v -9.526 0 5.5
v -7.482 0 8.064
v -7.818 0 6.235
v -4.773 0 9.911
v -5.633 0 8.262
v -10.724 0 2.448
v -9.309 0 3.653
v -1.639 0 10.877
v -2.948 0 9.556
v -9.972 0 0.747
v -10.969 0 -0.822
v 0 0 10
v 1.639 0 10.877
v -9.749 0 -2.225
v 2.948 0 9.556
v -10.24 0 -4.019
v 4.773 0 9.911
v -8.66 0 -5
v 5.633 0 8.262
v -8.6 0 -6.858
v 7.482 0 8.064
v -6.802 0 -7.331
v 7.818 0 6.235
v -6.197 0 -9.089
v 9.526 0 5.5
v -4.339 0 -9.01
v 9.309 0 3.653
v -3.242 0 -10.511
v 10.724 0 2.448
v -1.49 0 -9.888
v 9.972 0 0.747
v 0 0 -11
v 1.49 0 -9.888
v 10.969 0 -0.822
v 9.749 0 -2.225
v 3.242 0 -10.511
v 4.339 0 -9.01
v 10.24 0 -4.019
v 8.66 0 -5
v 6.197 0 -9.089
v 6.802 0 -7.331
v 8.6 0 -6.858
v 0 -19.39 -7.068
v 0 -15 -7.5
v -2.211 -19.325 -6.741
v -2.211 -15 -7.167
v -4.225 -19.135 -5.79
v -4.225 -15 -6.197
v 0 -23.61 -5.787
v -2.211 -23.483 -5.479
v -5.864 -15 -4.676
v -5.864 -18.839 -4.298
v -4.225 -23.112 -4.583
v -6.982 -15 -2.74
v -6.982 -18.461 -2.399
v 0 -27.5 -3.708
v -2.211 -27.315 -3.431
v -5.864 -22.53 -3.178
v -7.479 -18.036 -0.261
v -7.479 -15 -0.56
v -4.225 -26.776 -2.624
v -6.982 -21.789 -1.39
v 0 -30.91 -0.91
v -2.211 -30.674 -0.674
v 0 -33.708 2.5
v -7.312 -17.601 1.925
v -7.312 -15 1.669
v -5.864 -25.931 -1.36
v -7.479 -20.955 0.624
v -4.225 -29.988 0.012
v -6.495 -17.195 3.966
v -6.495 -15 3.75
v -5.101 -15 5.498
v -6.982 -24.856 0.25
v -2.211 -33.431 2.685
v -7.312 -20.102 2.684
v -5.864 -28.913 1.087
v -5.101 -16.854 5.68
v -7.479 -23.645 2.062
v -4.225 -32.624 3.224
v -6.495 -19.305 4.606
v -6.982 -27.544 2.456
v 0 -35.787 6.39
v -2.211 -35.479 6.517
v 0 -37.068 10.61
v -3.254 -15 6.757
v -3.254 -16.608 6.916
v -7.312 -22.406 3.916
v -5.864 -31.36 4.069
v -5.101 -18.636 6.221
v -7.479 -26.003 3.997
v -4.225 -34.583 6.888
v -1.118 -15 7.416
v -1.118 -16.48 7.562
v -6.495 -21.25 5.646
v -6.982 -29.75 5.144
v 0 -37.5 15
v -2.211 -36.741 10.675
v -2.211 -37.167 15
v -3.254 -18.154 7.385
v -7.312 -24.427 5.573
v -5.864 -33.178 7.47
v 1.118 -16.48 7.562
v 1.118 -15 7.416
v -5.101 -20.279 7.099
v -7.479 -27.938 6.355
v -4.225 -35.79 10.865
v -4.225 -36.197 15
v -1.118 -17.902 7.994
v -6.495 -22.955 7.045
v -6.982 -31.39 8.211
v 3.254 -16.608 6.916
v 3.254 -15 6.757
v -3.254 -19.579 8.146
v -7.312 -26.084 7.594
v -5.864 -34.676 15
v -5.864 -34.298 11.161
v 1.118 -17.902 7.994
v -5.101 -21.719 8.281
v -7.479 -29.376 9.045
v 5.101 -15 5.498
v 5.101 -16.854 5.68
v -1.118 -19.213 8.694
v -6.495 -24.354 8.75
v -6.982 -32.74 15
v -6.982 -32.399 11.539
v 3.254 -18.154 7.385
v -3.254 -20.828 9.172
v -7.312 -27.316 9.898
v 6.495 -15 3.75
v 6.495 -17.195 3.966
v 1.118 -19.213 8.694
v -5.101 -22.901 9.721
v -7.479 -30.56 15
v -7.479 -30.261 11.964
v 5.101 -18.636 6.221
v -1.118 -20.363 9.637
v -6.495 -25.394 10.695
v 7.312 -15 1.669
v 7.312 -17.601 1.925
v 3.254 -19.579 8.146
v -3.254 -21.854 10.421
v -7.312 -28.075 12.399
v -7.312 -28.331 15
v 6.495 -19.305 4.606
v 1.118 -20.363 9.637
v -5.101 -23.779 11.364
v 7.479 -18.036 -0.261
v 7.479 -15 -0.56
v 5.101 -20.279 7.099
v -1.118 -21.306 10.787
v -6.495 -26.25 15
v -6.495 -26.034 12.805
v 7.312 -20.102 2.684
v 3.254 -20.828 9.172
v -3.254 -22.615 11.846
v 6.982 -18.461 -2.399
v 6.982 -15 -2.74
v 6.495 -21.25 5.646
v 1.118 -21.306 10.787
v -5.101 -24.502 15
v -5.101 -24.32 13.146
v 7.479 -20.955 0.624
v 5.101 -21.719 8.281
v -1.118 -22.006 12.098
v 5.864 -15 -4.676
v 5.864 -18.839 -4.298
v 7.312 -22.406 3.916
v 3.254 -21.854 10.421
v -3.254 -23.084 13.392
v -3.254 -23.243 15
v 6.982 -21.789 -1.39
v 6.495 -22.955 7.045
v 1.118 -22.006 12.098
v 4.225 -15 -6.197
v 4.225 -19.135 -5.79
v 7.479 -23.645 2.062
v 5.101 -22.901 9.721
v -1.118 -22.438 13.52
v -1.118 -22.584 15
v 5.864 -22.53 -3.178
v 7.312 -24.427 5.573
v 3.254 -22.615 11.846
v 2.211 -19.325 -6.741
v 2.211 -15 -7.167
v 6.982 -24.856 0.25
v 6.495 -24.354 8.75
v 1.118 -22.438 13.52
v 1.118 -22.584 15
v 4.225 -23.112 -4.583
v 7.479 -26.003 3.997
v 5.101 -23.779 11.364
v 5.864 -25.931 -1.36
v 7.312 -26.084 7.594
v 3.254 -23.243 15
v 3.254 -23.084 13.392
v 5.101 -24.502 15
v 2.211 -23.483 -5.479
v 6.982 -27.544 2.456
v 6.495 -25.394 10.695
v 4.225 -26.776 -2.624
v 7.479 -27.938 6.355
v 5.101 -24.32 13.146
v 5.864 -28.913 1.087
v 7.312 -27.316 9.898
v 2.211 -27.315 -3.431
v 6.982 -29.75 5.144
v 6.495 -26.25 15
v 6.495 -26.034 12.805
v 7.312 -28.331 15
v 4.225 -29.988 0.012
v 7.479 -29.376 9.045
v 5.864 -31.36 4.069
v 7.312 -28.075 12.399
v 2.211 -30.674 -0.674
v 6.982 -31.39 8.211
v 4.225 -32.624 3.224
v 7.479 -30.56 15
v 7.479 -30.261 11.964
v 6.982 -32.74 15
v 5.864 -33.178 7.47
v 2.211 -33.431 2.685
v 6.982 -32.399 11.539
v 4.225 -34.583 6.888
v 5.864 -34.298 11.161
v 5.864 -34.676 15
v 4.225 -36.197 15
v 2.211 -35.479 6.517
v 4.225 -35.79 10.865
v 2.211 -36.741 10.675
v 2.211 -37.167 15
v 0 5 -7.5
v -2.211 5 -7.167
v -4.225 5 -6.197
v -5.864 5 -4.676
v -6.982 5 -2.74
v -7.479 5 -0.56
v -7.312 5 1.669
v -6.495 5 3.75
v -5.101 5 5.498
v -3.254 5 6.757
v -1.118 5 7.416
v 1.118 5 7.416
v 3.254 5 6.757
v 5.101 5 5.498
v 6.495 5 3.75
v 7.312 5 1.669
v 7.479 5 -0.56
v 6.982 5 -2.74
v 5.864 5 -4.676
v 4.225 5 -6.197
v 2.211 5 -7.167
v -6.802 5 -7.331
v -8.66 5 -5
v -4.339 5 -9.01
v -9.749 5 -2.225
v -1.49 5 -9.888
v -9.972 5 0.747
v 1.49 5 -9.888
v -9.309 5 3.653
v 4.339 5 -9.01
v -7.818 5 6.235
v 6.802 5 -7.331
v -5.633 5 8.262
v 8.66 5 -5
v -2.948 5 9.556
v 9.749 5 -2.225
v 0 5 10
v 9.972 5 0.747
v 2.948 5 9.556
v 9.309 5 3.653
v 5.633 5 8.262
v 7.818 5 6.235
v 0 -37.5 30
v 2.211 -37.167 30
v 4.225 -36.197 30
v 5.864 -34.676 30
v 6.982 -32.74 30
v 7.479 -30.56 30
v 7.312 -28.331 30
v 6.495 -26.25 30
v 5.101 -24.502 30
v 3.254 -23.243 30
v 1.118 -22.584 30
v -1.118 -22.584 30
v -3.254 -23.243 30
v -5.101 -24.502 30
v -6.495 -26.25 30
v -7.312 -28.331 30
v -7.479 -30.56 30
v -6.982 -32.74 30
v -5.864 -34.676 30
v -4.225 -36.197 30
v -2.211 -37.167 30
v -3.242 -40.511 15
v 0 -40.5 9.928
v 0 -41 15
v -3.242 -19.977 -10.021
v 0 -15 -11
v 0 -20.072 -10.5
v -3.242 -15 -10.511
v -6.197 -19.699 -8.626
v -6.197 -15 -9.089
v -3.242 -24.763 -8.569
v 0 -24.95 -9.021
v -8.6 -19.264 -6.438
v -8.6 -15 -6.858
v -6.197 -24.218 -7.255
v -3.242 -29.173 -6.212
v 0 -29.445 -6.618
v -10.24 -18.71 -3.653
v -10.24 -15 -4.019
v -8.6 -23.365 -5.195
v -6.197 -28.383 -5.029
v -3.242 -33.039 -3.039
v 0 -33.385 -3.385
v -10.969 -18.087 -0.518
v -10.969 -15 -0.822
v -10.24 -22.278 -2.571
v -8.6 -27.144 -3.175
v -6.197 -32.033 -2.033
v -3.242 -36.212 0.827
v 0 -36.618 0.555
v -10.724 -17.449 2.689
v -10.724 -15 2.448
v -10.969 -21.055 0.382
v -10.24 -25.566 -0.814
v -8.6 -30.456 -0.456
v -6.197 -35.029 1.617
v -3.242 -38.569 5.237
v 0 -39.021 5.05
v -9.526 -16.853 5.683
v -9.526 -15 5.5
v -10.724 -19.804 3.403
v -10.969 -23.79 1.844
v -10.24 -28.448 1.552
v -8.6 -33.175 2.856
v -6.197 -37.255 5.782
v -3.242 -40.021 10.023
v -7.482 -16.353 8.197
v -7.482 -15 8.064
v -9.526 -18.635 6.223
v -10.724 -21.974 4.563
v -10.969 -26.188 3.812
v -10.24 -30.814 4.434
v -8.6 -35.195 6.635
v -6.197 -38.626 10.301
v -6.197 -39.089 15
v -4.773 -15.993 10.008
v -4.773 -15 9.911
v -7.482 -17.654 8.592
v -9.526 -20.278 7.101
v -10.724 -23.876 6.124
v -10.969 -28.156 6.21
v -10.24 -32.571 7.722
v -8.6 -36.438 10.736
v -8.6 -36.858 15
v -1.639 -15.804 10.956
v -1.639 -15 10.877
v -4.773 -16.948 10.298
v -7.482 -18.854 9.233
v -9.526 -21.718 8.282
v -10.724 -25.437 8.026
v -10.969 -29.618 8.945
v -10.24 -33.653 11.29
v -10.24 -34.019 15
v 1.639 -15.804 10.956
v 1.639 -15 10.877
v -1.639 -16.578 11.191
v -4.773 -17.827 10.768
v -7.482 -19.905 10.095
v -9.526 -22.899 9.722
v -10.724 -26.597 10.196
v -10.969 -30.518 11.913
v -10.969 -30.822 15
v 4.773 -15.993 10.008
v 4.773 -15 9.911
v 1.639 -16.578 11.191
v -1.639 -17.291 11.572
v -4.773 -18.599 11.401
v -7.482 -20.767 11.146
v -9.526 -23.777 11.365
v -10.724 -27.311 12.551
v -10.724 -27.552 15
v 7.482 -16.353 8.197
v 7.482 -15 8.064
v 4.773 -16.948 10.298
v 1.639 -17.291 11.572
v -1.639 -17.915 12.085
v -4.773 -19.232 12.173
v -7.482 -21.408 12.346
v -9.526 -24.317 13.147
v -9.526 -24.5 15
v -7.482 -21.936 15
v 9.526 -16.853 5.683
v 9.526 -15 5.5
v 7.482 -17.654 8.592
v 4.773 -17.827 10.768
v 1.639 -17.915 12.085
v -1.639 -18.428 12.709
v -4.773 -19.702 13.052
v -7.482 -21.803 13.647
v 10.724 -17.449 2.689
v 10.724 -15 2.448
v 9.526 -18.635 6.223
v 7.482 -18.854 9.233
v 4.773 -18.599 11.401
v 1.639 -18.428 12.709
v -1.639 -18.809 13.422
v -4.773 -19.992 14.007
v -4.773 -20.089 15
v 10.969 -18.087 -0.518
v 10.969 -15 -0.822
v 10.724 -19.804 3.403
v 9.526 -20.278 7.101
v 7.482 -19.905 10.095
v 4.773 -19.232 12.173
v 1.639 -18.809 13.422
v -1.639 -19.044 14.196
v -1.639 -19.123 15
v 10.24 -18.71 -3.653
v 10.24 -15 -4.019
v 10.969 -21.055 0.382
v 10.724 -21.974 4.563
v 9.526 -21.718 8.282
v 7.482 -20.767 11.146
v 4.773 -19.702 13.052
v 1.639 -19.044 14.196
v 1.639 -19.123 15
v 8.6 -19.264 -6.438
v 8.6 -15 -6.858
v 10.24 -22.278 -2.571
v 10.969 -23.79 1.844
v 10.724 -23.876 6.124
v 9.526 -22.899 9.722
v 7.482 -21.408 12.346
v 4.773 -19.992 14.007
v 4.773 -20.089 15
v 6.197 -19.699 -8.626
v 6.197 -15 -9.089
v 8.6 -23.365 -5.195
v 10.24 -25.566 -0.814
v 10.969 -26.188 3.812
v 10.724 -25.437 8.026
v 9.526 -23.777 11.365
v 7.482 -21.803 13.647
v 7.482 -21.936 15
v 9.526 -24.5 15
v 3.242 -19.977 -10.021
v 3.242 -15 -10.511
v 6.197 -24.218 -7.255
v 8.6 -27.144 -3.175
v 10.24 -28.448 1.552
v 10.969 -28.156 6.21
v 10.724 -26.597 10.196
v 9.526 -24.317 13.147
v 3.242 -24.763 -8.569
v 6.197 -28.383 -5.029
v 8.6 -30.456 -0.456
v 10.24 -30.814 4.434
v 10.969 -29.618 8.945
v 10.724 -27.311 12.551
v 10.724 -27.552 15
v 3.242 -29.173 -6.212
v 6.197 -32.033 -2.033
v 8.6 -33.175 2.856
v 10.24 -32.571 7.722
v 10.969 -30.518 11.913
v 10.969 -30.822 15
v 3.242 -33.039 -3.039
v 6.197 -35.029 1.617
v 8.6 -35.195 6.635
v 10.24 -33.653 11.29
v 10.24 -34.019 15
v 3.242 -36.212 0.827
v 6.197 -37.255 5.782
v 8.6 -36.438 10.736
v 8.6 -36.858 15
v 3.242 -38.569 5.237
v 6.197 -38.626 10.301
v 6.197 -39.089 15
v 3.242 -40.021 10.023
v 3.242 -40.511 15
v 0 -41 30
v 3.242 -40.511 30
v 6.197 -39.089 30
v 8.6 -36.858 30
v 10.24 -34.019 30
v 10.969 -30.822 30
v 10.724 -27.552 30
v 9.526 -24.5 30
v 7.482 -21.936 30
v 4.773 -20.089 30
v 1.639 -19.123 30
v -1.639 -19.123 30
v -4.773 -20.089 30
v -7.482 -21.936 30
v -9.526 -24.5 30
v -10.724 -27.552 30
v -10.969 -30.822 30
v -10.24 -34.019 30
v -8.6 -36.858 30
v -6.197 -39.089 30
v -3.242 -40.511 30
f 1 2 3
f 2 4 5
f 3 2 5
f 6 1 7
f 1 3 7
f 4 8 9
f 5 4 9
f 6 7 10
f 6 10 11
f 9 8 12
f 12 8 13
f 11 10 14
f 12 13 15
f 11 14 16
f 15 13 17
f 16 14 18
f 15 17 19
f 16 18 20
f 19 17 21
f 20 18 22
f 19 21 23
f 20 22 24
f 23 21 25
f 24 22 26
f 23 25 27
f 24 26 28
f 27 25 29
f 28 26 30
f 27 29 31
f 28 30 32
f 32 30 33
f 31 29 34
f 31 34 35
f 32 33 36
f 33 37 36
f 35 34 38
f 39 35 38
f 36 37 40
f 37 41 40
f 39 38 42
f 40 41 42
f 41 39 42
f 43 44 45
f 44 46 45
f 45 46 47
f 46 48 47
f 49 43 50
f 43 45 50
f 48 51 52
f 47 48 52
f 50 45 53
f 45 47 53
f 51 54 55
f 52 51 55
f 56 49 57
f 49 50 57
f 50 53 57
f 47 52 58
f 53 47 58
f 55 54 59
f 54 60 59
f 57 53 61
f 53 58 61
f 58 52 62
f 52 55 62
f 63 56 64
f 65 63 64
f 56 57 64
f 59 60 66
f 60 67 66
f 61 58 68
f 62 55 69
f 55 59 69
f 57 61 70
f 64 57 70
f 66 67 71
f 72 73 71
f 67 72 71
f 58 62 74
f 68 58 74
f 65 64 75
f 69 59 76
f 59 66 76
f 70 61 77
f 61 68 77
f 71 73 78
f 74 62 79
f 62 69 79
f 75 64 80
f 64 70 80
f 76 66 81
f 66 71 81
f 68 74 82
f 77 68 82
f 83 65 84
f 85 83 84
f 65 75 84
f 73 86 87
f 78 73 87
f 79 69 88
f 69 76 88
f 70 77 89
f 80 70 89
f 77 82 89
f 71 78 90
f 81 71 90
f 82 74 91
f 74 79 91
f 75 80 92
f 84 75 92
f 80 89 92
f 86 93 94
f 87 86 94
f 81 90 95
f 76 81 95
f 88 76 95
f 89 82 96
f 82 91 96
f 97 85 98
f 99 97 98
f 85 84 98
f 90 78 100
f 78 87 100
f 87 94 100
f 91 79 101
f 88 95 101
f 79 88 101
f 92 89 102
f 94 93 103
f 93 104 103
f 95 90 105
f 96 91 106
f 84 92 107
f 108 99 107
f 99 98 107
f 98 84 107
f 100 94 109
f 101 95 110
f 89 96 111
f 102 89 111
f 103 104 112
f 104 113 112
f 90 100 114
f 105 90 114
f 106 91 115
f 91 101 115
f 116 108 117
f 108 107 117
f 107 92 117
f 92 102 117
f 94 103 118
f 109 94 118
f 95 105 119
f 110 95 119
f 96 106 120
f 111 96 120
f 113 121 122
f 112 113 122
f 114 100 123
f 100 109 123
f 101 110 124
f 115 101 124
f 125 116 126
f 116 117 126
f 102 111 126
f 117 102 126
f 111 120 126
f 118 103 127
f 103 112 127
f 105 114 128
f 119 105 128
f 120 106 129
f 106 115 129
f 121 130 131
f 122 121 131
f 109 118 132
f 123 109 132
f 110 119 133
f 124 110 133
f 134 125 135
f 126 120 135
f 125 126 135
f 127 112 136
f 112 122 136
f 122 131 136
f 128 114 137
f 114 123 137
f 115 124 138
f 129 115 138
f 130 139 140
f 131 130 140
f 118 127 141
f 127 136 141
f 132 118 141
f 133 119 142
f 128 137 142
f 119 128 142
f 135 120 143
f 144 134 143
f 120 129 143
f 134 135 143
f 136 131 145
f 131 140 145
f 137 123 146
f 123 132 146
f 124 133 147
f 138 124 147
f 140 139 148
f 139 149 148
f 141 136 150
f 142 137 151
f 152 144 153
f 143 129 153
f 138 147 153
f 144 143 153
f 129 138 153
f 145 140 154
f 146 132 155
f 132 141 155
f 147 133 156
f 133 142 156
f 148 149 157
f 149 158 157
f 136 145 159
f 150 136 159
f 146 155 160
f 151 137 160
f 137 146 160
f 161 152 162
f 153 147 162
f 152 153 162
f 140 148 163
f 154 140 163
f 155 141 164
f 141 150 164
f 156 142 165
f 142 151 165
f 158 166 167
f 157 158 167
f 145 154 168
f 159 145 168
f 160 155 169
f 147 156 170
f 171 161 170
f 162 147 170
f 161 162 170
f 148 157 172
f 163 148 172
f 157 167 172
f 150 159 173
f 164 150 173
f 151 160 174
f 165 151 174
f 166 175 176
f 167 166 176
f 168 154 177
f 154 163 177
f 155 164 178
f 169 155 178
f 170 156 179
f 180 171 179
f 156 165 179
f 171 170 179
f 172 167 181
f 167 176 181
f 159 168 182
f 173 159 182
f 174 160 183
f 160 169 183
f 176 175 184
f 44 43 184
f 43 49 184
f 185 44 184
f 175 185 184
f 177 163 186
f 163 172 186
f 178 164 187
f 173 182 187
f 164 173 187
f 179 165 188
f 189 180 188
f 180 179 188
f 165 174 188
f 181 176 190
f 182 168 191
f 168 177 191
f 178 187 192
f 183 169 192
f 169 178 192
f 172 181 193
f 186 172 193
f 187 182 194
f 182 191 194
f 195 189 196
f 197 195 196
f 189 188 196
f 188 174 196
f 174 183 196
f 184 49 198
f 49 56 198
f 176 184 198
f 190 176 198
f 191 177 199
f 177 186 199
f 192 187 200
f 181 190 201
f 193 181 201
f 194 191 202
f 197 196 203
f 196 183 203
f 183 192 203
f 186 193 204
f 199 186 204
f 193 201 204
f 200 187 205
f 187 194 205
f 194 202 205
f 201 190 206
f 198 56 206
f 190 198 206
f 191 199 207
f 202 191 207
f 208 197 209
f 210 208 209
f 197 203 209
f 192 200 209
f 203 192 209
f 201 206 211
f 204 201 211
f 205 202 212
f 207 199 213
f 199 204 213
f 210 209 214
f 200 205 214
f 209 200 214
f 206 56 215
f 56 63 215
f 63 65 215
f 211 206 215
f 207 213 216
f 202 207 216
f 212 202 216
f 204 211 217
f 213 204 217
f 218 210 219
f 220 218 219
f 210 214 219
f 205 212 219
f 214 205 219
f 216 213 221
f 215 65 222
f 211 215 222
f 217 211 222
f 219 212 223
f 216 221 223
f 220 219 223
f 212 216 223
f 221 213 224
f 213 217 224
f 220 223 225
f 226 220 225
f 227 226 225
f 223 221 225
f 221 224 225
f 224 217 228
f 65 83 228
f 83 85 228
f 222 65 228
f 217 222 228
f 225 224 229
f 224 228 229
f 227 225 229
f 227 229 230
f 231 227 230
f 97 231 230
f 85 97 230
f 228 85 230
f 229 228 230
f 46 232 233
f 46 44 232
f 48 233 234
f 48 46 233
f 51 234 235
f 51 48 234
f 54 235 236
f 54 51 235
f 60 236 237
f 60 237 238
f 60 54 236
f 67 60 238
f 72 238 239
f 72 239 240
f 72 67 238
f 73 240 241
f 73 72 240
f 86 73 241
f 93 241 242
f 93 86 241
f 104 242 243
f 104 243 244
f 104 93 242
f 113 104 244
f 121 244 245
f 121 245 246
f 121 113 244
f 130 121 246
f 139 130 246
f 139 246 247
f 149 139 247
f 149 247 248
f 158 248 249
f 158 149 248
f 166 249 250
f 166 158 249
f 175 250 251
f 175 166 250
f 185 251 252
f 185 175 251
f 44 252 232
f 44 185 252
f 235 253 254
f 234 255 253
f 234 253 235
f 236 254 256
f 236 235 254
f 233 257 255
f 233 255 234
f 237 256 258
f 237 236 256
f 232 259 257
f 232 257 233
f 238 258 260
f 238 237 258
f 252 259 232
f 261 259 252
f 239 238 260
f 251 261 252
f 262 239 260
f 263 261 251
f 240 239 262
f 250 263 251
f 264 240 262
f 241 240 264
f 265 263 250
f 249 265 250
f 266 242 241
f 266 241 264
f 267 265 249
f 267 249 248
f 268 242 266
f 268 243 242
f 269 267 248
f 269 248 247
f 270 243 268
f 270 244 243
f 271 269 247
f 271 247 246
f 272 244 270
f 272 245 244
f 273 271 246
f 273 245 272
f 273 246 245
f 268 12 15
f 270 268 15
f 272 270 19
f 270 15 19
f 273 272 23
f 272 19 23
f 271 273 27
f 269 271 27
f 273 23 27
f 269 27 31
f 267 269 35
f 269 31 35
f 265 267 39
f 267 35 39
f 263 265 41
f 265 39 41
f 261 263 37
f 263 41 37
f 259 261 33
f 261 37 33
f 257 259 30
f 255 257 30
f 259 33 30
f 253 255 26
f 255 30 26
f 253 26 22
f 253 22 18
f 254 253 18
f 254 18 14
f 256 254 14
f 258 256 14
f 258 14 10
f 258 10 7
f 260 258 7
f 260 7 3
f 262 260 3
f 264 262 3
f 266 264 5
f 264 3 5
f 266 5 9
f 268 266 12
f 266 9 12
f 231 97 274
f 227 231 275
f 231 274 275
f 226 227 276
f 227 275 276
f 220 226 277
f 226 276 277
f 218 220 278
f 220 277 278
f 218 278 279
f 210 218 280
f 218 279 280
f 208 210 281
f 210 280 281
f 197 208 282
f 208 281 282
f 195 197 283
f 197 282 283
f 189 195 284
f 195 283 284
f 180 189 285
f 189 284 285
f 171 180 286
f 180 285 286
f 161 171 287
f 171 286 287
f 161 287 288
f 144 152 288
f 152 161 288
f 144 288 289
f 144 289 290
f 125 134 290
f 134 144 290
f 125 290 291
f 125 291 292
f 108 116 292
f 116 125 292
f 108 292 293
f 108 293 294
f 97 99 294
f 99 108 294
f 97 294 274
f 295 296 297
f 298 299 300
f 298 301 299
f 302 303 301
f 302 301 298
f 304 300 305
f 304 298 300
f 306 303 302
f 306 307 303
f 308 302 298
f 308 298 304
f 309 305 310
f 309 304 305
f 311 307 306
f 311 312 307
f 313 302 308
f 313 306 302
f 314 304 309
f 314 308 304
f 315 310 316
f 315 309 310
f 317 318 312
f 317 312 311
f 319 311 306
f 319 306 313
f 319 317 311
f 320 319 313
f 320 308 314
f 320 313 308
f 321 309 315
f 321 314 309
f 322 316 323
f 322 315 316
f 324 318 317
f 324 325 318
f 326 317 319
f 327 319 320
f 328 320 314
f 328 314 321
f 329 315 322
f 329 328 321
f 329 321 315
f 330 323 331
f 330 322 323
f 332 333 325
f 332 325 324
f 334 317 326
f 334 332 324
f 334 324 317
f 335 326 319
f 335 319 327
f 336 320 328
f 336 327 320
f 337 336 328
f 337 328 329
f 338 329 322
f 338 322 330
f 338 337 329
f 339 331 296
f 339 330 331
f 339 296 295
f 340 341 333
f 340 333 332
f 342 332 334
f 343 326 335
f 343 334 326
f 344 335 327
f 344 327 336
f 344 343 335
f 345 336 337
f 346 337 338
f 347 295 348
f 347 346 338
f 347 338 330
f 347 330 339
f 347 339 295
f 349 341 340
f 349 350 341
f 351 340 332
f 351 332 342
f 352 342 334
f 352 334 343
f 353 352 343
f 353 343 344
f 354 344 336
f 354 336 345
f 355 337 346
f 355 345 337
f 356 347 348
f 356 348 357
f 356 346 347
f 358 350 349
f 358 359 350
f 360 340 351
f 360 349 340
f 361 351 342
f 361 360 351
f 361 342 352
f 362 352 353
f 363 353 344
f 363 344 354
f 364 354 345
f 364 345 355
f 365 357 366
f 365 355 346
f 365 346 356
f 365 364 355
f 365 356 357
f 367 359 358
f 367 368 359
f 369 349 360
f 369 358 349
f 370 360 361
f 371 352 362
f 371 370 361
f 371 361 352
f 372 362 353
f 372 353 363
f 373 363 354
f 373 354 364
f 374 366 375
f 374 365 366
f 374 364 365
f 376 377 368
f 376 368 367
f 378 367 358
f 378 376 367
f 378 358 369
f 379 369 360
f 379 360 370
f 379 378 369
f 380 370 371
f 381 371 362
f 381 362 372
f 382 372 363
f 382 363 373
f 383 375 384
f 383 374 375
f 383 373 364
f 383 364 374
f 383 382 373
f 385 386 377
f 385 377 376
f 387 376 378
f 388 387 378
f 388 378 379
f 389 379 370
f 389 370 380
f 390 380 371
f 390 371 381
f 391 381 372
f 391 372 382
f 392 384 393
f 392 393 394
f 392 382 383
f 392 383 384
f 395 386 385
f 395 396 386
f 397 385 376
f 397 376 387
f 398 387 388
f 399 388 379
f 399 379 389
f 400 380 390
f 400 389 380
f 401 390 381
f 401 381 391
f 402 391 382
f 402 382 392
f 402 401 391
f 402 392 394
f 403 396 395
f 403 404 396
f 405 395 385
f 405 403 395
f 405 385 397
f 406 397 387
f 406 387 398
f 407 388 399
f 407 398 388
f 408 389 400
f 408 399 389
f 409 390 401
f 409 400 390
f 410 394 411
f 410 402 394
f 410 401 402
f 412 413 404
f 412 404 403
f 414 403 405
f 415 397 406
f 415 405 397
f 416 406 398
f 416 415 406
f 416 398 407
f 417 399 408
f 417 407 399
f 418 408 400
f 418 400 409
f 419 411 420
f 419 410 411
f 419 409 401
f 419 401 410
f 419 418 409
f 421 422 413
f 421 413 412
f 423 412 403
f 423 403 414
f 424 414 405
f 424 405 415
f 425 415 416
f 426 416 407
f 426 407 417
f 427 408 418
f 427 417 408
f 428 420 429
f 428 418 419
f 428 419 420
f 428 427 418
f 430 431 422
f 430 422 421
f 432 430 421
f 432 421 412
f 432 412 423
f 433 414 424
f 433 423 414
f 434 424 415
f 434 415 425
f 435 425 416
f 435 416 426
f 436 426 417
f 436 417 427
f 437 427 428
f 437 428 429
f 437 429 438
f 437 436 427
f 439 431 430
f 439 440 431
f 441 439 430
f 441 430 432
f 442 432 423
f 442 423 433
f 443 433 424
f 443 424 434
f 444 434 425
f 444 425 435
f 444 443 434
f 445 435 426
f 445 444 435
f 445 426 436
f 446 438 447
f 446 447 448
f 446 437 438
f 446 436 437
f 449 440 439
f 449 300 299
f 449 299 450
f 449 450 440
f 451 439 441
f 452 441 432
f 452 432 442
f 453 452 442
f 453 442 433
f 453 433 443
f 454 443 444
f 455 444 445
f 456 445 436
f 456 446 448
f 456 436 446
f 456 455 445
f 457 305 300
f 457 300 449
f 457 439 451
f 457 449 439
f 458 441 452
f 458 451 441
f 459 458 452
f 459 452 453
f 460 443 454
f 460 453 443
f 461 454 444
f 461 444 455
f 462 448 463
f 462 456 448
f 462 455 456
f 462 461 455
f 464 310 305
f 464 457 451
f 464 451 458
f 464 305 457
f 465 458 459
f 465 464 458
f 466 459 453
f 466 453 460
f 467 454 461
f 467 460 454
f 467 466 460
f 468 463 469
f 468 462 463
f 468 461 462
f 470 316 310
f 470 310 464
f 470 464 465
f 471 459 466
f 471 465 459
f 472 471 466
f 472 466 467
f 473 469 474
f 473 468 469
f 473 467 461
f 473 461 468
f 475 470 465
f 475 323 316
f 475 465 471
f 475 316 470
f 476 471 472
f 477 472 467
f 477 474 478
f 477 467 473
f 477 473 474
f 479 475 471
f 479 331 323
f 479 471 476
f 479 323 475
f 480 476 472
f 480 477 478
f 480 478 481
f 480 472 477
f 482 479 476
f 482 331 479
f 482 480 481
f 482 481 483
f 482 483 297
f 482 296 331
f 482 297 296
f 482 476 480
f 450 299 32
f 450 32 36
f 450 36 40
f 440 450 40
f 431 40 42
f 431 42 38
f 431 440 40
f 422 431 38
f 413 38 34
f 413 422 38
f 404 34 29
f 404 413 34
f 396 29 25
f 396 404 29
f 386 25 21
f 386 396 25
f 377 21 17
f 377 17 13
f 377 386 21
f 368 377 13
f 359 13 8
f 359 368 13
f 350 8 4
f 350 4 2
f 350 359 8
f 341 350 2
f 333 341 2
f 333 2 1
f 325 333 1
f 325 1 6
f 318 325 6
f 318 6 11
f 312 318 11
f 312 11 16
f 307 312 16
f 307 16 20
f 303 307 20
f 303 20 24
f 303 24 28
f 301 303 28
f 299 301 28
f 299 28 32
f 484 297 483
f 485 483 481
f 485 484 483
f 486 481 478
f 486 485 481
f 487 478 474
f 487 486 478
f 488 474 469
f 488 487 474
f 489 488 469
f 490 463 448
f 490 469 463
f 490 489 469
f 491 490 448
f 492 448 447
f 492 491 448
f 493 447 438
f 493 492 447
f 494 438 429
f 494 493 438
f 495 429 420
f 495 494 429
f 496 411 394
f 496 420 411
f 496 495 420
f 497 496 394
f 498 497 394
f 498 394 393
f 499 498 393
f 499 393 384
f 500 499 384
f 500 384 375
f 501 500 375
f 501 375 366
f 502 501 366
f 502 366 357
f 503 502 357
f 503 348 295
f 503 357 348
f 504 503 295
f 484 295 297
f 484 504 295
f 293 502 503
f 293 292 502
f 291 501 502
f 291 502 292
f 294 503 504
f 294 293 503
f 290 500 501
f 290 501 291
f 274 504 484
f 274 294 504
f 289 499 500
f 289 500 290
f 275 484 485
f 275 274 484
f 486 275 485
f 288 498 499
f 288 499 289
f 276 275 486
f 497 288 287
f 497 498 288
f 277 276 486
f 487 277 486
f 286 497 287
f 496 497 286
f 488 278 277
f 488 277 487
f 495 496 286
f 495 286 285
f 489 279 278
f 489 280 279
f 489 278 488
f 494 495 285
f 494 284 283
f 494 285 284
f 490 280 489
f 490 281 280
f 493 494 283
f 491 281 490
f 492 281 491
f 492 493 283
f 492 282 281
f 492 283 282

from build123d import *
from build123d.topology import SkipClean

# Parameters (mm, degrees)
SWEEP1_PROFILE_R     = 11
CUT_SWEEP1_PROFILE_R = 7.5
SKETCH34_R           = 10
SKETCH34_R_2         = 7.5
BOSS_EXTRUDE1_DEPTH  = 5


with BuildPart() as part:
    # Sweep1: sweep along a path in Sketch1
    with BuildLine(Plane(origin=(0, 0, 0), x_dir=(0, 0, -1), z_dir=(1, 0, 0))) as sweep1_path:
        Line((0, 0), (0, -15))
        ThreePointArc((0, -15), (-4.393398282, -25.606601718), (-15, -30))
        Line((-15, -30), (-30, -30))
    # Sweep1 profile (on start of the path) → Sweep1 (sweep)
    with BuildSketch(Plane(origin=(0, 0, 0), x_dir=(0, 0, -1), z_dir=(0, -1, 0))):
        Circle(SWEEP1_PROFILE_R)
    sweep(path=sweep1_path.line)

    # Cut-Sweep1: sweep along a path in Sketch1<2>
    with BuildLine(Plane(origin=(0, 0, 0), x_dir=(0, 0, -1), z_dir=(1, 0, 0))) as cut_sweep1_path:
        Line((0, 0), (0, -15))
        ThreePointArc((0, -15), (-4.393398282, -25.606601718), (-15, -30))
        Line((-15, -30), (-30, -30))
    # Cut-Sweep1 profile (on start of the path) → Cut-Sweep1 (sweep, cut)
    with BuildSketch(Plane(origin=(0, 0, 0), x_dir=(0, 0, -1), z_dir=(0, -1, 0))):
        Circle(CUT_SWEEP1_PROFILE_R)
    sweep(path=cut_sweep1_path.line, mode=Mode.SUBTRACT)

    # Sketch34 → Boss-Extrude1 (add)
    with SkipClean():  # the faces are left unmerged after this step: merging them gives an invalid solid
        with BuildSketch(Plane(origin=(0, 0, 0), x_dir=(1, 0, 0), z_dir=(0, 1, 0))):
            Circle(SKETCH34_R)
            Circle(SKETCH34_R_2, mode=Mode.SUBTRACT)
        extrude(amount=BOSS_EXTRUDE1_DEPTH)


solid = part.part
